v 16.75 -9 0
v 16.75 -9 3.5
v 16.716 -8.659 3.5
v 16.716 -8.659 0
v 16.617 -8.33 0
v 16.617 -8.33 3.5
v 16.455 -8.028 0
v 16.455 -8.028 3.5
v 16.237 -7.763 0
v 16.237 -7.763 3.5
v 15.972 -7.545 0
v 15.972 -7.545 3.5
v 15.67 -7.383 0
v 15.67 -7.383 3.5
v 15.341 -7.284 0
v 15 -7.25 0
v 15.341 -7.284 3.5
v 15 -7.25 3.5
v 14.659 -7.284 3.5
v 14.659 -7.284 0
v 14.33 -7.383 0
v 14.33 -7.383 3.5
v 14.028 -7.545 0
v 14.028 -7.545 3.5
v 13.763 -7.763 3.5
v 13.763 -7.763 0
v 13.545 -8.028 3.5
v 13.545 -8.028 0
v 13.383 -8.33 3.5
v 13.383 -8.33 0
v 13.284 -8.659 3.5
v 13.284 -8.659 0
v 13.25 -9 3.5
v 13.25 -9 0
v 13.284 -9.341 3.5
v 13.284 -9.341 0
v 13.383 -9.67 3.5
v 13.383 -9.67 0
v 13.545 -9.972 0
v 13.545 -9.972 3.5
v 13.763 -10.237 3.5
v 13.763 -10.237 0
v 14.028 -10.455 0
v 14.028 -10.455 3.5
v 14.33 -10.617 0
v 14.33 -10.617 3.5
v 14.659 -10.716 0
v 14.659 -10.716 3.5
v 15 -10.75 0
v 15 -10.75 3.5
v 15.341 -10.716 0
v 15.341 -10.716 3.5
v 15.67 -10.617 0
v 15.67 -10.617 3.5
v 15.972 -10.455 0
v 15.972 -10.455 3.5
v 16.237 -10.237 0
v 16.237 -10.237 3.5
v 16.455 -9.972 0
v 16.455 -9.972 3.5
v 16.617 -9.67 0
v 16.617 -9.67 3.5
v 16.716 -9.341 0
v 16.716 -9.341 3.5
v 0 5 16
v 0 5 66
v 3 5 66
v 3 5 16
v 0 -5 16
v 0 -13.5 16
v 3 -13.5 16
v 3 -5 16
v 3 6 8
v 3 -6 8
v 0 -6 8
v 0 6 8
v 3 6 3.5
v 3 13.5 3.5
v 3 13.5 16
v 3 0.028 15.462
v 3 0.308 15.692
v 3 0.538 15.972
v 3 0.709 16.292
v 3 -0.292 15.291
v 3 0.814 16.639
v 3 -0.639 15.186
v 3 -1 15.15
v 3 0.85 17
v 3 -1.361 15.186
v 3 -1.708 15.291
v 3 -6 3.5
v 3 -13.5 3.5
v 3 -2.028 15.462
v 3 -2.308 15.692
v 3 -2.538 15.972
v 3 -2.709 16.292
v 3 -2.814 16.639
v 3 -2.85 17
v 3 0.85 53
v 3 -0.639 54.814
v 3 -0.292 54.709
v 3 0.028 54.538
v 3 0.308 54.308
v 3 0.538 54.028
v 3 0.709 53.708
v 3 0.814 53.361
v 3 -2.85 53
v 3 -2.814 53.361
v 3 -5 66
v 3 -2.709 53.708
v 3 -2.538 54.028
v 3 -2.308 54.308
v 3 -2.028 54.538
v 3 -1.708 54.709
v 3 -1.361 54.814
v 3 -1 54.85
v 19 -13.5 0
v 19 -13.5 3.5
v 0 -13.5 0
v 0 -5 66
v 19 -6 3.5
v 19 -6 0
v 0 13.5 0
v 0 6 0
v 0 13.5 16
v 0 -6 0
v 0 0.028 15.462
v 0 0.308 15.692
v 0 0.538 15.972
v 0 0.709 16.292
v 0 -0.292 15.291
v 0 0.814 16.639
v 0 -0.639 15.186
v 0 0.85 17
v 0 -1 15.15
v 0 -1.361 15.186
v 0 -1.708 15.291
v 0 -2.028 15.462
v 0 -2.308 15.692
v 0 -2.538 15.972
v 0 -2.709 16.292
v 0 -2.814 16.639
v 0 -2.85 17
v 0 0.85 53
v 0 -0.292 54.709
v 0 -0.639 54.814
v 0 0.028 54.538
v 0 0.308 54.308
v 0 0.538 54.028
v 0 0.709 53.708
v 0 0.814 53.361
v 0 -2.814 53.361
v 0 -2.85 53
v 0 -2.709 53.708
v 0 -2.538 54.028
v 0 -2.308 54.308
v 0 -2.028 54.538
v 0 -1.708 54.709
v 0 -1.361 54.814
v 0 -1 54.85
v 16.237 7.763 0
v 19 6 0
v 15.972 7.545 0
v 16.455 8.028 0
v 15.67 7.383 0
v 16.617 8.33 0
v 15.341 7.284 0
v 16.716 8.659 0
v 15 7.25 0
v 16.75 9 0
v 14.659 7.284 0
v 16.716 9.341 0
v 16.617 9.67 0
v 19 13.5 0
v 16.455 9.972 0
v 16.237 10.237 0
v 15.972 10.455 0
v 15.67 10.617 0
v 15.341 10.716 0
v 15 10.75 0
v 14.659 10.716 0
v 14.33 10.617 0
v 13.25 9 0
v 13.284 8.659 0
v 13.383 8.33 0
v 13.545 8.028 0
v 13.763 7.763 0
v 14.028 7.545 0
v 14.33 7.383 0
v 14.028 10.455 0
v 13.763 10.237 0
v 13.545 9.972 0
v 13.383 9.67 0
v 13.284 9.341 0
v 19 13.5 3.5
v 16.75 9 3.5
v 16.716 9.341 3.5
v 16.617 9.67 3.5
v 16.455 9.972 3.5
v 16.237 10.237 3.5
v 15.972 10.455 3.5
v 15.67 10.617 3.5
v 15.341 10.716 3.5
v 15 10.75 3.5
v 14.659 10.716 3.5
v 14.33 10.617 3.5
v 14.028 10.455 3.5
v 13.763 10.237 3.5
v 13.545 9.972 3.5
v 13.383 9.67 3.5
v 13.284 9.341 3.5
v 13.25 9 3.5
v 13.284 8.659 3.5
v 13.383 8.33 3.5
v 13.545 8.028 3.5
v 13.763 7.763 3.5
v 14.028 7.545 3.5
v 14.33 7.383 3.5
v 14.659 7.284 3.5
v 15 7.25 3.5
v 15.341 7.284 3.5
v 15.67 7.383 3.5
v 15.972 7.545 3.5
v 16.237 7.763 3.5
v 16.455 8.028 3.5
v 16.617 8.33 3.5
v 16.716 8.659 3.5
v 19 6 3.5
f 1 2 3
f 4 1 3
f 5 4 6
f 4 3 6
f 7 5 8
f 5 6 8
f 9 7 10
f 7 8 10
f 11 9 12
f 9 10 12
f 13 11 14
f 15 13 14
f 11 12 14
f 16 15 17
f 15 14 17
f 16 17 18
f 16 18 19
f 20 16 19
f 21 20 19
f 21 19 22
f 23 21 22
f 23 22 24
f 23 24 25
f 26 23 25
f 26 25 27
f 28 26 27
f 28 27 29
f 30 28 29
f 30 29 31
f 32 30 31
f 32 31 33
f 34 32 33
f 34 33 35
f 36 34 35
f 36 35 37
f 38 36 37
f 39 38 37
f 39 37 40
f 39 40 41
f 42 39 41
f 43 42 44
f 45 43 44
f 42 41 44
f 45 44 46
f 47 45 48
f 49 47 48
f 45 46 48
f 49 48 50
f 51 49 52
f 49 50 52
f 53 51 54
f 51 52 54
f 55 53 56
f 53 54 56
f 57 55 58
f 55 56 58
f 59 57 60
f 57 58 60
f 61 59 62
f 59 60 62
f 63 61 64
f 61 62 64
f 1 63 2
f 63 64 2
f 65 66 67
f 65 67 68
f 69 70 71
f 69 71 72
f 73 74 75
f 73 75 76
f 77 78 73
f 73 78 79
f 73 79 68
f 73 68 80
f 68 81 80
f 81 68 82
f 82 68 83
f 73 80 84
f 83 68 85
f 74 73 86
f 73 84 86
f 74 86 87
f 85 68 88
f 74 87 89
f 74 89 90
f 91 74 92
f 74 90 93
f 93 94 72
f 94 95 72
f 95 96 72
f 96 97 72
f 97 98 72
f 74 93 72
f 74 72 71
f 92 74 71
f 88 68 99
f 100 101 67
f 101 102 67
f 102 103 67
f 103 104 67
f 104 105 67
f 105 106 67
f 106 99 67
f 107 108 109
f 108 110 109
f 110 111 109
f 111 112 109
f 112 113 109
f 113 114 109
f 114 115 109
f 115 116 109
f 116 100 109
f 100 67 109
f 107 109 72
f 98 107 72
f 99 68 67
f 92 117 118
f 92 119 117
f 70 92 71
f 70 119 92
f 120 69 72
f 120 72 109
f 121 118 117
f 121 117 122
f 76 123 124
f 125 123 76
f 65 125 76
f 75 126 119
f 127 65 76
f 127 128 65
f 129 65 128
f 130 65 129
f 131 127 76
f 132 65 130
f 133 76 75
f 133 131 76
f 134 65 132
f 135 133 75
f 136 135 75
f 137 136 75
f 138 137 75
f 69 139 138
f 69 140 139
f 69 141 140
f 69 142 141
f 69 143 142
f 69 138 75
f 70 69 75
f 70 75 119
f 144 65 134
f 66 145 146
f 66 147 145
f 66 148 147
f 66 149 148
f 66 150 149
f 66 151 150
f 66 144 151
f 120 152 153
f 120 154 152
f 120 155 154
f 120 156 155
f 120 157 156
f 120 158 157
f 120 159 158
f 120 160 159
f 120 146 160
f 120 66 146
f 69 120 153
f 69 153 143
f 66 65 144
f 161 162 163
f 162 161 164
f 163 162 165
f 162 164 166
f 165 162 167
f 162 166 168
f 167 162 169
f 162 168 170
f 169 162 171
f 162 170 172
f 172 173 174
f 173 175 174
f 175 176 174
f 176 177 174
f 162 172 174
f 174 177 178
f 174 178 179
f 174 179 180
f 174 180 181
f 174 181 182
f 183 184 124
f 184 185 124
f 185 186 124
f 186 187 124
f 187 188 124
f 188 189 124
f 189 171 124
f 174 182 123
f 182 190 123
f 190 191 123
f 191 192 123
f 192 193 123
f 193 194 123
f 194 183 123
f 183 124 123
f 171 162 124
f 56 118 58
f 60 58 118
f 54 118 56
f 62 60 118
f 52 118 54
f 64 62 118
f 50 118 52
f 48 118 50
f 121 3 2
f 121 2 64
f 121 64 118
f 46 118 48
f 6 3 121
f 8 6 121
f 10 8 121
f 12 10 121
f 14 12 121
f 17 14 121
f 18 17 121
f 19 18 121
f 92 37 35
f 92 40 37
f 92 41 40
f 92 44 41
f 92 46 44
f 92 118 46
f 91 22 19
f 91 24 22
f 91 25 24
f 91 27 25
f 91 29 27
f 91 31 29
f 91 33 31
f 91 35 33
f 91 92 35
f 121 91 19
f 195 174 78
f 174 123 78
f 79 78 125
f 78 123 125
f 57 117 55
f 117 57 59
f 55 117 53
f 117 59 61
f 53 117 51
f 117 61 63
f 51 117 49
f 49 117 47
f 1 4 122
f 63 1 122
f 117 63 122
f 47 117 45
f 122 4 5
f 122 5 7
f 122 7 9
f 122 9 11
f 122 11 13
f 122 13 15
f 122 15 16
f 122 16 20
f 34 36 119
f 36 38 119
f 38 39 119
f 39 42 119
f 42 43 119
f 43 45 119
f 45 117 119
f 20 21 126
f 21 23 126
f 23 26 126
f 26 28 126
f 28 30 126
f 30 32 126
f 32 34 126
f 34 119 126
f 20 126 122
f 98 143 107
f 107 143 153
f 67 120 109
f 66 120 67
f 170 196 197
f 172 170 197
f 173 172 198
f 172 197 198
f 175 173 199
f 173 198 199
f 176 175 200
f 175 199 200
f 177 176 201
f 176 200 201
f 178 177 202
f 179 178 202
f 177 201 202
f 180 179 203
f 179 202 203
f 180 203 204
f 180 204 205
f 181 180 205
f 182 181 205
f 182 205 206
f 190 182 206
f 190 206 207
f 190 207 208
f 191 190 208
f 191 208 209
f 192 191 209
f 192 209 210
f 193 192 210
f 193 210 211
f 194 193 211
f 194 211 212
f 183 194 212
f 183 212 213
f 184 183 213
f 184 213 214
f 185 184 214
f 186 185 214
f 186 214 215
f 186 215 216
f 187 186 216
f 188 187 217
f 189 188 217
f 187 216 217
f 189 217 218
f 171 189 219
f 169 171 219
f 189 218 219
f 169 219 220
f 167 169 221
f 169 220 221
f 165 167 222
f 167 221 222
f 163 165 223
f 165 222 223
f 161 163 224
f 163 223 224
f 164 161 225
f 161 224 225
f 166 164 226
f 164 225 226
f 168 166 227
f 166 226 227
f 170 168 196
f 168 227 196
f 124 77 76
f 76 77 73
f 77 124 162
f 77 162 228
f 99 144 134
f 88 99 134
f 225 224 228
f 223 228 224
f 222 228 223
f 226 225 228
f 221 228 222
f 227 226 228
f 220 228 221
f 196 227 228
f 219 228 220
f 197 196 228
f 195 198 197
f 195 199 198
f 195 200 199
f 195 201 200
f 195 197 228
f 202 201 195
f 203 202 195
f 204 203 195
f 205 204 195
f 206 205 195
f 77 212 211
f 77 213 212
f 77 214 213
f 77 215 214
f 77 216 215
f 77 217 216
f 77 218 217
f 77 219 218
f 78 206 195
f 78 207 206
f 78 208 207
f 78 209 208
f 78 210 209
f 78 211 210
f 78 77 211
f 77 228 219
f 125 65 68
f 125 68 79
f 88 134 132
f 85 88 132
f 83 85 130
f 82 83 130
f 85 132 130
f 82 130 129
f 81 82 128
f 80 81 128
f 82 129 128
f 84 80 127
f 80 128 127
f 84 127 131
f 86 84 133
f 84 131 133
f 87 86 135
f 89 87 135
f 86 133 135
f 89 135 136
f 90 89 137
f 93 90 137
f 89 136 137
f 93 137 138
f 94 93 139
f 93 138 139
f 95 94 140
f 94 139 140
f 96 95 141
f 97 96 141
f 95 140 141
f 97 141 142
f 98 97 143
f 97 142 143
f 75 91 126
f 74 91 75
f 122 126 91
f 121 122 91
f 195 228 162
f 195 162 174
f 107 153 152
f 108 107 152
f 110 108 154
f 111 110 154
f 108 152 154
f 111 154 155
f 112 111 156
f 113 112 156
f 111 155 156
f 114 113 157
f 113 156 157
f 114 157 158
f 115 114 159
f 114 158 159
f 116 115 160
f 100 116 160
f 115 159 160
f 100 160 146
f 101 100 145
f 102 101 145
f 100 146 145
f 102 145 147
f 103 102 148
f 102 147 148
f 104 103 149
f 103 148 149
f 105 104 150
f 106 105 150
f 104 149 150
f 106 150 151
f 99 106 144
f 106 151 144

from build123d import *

# Parameters (mm, degrees)
BOSS_EXTRUDE1_DEPTH = 3
SKETCH3_W           = 27
SKETCH3_H           = 3.5
BOSS_EXTRUDE2_DEPTH = 16
SKETCH4_R           = 1.75
CUT_EXTRUDE1_DEPTH  = 10
SKETCH5_W           = 12
SKETCH5_H           = 8
CUT_EXTRUDE2_DEPTH  = 21


with BuildPart() as part:
    # Sketch2 → Boss-Extrude1 (new body)
    with BuildSketch(Plane.YZ):
        Polygon((-5, 66), (5, 66), (5, 16), (13.5, 16), (13.5, 0), (-13.5, 0), (-13.5, 16), (-5, 16), align=None)
        with BuildLine():
            Line((0.85, 53), (0.85, 17))
            ThreePointArc((0.85, 17), (-1, 15.15), (-2.85, 17))
            Line((-2.85, 17), (-2.85, 53))
            ThreePointArc((-2.85, 53), (-1, 54.85), (0.85, 53))
        make_face(mode=Mode.SUBTRACT)
    extrude(amount=BOSS_EXTRUDE1_DEPTH)

    # Sketch3 → Boss-Extrude2 (add)
    with BuildSketch(Plane.YZ.offset(3)):
        with Locations((0, 1.75)):
            Rectangle(SKETCH3_W, SKETCH3_H)
    extrude(amount=BOSS_EXTRUDE2_DEPTH)

    # Sketch4 → Cut-Extrude1 (cut)
    with BuildSketch(Plane.XY.offset(3.5)):
        with Locations((15, 9)):
            Circle(SKETCH4_R)
        with Locations((15, -9)):
            Circle(SKETCH4_R)
    extrude(amount=-CUT_EXTRUDE1_DEPTH, mode=Mode.SUBTRACT)

    # Sketch5 → Cut-Extrude2 (cut)
    with BuildSketch(Plane.YZ.offset(19)):
        with Locations((0, 4)):
            Rectangle(SKETCH5_W, SKETCH5_H)
    extrude(amount=-CUT_EXTRUDE2_DEPTH, mode=Mode.SUBTRACT)


solid = part.part
